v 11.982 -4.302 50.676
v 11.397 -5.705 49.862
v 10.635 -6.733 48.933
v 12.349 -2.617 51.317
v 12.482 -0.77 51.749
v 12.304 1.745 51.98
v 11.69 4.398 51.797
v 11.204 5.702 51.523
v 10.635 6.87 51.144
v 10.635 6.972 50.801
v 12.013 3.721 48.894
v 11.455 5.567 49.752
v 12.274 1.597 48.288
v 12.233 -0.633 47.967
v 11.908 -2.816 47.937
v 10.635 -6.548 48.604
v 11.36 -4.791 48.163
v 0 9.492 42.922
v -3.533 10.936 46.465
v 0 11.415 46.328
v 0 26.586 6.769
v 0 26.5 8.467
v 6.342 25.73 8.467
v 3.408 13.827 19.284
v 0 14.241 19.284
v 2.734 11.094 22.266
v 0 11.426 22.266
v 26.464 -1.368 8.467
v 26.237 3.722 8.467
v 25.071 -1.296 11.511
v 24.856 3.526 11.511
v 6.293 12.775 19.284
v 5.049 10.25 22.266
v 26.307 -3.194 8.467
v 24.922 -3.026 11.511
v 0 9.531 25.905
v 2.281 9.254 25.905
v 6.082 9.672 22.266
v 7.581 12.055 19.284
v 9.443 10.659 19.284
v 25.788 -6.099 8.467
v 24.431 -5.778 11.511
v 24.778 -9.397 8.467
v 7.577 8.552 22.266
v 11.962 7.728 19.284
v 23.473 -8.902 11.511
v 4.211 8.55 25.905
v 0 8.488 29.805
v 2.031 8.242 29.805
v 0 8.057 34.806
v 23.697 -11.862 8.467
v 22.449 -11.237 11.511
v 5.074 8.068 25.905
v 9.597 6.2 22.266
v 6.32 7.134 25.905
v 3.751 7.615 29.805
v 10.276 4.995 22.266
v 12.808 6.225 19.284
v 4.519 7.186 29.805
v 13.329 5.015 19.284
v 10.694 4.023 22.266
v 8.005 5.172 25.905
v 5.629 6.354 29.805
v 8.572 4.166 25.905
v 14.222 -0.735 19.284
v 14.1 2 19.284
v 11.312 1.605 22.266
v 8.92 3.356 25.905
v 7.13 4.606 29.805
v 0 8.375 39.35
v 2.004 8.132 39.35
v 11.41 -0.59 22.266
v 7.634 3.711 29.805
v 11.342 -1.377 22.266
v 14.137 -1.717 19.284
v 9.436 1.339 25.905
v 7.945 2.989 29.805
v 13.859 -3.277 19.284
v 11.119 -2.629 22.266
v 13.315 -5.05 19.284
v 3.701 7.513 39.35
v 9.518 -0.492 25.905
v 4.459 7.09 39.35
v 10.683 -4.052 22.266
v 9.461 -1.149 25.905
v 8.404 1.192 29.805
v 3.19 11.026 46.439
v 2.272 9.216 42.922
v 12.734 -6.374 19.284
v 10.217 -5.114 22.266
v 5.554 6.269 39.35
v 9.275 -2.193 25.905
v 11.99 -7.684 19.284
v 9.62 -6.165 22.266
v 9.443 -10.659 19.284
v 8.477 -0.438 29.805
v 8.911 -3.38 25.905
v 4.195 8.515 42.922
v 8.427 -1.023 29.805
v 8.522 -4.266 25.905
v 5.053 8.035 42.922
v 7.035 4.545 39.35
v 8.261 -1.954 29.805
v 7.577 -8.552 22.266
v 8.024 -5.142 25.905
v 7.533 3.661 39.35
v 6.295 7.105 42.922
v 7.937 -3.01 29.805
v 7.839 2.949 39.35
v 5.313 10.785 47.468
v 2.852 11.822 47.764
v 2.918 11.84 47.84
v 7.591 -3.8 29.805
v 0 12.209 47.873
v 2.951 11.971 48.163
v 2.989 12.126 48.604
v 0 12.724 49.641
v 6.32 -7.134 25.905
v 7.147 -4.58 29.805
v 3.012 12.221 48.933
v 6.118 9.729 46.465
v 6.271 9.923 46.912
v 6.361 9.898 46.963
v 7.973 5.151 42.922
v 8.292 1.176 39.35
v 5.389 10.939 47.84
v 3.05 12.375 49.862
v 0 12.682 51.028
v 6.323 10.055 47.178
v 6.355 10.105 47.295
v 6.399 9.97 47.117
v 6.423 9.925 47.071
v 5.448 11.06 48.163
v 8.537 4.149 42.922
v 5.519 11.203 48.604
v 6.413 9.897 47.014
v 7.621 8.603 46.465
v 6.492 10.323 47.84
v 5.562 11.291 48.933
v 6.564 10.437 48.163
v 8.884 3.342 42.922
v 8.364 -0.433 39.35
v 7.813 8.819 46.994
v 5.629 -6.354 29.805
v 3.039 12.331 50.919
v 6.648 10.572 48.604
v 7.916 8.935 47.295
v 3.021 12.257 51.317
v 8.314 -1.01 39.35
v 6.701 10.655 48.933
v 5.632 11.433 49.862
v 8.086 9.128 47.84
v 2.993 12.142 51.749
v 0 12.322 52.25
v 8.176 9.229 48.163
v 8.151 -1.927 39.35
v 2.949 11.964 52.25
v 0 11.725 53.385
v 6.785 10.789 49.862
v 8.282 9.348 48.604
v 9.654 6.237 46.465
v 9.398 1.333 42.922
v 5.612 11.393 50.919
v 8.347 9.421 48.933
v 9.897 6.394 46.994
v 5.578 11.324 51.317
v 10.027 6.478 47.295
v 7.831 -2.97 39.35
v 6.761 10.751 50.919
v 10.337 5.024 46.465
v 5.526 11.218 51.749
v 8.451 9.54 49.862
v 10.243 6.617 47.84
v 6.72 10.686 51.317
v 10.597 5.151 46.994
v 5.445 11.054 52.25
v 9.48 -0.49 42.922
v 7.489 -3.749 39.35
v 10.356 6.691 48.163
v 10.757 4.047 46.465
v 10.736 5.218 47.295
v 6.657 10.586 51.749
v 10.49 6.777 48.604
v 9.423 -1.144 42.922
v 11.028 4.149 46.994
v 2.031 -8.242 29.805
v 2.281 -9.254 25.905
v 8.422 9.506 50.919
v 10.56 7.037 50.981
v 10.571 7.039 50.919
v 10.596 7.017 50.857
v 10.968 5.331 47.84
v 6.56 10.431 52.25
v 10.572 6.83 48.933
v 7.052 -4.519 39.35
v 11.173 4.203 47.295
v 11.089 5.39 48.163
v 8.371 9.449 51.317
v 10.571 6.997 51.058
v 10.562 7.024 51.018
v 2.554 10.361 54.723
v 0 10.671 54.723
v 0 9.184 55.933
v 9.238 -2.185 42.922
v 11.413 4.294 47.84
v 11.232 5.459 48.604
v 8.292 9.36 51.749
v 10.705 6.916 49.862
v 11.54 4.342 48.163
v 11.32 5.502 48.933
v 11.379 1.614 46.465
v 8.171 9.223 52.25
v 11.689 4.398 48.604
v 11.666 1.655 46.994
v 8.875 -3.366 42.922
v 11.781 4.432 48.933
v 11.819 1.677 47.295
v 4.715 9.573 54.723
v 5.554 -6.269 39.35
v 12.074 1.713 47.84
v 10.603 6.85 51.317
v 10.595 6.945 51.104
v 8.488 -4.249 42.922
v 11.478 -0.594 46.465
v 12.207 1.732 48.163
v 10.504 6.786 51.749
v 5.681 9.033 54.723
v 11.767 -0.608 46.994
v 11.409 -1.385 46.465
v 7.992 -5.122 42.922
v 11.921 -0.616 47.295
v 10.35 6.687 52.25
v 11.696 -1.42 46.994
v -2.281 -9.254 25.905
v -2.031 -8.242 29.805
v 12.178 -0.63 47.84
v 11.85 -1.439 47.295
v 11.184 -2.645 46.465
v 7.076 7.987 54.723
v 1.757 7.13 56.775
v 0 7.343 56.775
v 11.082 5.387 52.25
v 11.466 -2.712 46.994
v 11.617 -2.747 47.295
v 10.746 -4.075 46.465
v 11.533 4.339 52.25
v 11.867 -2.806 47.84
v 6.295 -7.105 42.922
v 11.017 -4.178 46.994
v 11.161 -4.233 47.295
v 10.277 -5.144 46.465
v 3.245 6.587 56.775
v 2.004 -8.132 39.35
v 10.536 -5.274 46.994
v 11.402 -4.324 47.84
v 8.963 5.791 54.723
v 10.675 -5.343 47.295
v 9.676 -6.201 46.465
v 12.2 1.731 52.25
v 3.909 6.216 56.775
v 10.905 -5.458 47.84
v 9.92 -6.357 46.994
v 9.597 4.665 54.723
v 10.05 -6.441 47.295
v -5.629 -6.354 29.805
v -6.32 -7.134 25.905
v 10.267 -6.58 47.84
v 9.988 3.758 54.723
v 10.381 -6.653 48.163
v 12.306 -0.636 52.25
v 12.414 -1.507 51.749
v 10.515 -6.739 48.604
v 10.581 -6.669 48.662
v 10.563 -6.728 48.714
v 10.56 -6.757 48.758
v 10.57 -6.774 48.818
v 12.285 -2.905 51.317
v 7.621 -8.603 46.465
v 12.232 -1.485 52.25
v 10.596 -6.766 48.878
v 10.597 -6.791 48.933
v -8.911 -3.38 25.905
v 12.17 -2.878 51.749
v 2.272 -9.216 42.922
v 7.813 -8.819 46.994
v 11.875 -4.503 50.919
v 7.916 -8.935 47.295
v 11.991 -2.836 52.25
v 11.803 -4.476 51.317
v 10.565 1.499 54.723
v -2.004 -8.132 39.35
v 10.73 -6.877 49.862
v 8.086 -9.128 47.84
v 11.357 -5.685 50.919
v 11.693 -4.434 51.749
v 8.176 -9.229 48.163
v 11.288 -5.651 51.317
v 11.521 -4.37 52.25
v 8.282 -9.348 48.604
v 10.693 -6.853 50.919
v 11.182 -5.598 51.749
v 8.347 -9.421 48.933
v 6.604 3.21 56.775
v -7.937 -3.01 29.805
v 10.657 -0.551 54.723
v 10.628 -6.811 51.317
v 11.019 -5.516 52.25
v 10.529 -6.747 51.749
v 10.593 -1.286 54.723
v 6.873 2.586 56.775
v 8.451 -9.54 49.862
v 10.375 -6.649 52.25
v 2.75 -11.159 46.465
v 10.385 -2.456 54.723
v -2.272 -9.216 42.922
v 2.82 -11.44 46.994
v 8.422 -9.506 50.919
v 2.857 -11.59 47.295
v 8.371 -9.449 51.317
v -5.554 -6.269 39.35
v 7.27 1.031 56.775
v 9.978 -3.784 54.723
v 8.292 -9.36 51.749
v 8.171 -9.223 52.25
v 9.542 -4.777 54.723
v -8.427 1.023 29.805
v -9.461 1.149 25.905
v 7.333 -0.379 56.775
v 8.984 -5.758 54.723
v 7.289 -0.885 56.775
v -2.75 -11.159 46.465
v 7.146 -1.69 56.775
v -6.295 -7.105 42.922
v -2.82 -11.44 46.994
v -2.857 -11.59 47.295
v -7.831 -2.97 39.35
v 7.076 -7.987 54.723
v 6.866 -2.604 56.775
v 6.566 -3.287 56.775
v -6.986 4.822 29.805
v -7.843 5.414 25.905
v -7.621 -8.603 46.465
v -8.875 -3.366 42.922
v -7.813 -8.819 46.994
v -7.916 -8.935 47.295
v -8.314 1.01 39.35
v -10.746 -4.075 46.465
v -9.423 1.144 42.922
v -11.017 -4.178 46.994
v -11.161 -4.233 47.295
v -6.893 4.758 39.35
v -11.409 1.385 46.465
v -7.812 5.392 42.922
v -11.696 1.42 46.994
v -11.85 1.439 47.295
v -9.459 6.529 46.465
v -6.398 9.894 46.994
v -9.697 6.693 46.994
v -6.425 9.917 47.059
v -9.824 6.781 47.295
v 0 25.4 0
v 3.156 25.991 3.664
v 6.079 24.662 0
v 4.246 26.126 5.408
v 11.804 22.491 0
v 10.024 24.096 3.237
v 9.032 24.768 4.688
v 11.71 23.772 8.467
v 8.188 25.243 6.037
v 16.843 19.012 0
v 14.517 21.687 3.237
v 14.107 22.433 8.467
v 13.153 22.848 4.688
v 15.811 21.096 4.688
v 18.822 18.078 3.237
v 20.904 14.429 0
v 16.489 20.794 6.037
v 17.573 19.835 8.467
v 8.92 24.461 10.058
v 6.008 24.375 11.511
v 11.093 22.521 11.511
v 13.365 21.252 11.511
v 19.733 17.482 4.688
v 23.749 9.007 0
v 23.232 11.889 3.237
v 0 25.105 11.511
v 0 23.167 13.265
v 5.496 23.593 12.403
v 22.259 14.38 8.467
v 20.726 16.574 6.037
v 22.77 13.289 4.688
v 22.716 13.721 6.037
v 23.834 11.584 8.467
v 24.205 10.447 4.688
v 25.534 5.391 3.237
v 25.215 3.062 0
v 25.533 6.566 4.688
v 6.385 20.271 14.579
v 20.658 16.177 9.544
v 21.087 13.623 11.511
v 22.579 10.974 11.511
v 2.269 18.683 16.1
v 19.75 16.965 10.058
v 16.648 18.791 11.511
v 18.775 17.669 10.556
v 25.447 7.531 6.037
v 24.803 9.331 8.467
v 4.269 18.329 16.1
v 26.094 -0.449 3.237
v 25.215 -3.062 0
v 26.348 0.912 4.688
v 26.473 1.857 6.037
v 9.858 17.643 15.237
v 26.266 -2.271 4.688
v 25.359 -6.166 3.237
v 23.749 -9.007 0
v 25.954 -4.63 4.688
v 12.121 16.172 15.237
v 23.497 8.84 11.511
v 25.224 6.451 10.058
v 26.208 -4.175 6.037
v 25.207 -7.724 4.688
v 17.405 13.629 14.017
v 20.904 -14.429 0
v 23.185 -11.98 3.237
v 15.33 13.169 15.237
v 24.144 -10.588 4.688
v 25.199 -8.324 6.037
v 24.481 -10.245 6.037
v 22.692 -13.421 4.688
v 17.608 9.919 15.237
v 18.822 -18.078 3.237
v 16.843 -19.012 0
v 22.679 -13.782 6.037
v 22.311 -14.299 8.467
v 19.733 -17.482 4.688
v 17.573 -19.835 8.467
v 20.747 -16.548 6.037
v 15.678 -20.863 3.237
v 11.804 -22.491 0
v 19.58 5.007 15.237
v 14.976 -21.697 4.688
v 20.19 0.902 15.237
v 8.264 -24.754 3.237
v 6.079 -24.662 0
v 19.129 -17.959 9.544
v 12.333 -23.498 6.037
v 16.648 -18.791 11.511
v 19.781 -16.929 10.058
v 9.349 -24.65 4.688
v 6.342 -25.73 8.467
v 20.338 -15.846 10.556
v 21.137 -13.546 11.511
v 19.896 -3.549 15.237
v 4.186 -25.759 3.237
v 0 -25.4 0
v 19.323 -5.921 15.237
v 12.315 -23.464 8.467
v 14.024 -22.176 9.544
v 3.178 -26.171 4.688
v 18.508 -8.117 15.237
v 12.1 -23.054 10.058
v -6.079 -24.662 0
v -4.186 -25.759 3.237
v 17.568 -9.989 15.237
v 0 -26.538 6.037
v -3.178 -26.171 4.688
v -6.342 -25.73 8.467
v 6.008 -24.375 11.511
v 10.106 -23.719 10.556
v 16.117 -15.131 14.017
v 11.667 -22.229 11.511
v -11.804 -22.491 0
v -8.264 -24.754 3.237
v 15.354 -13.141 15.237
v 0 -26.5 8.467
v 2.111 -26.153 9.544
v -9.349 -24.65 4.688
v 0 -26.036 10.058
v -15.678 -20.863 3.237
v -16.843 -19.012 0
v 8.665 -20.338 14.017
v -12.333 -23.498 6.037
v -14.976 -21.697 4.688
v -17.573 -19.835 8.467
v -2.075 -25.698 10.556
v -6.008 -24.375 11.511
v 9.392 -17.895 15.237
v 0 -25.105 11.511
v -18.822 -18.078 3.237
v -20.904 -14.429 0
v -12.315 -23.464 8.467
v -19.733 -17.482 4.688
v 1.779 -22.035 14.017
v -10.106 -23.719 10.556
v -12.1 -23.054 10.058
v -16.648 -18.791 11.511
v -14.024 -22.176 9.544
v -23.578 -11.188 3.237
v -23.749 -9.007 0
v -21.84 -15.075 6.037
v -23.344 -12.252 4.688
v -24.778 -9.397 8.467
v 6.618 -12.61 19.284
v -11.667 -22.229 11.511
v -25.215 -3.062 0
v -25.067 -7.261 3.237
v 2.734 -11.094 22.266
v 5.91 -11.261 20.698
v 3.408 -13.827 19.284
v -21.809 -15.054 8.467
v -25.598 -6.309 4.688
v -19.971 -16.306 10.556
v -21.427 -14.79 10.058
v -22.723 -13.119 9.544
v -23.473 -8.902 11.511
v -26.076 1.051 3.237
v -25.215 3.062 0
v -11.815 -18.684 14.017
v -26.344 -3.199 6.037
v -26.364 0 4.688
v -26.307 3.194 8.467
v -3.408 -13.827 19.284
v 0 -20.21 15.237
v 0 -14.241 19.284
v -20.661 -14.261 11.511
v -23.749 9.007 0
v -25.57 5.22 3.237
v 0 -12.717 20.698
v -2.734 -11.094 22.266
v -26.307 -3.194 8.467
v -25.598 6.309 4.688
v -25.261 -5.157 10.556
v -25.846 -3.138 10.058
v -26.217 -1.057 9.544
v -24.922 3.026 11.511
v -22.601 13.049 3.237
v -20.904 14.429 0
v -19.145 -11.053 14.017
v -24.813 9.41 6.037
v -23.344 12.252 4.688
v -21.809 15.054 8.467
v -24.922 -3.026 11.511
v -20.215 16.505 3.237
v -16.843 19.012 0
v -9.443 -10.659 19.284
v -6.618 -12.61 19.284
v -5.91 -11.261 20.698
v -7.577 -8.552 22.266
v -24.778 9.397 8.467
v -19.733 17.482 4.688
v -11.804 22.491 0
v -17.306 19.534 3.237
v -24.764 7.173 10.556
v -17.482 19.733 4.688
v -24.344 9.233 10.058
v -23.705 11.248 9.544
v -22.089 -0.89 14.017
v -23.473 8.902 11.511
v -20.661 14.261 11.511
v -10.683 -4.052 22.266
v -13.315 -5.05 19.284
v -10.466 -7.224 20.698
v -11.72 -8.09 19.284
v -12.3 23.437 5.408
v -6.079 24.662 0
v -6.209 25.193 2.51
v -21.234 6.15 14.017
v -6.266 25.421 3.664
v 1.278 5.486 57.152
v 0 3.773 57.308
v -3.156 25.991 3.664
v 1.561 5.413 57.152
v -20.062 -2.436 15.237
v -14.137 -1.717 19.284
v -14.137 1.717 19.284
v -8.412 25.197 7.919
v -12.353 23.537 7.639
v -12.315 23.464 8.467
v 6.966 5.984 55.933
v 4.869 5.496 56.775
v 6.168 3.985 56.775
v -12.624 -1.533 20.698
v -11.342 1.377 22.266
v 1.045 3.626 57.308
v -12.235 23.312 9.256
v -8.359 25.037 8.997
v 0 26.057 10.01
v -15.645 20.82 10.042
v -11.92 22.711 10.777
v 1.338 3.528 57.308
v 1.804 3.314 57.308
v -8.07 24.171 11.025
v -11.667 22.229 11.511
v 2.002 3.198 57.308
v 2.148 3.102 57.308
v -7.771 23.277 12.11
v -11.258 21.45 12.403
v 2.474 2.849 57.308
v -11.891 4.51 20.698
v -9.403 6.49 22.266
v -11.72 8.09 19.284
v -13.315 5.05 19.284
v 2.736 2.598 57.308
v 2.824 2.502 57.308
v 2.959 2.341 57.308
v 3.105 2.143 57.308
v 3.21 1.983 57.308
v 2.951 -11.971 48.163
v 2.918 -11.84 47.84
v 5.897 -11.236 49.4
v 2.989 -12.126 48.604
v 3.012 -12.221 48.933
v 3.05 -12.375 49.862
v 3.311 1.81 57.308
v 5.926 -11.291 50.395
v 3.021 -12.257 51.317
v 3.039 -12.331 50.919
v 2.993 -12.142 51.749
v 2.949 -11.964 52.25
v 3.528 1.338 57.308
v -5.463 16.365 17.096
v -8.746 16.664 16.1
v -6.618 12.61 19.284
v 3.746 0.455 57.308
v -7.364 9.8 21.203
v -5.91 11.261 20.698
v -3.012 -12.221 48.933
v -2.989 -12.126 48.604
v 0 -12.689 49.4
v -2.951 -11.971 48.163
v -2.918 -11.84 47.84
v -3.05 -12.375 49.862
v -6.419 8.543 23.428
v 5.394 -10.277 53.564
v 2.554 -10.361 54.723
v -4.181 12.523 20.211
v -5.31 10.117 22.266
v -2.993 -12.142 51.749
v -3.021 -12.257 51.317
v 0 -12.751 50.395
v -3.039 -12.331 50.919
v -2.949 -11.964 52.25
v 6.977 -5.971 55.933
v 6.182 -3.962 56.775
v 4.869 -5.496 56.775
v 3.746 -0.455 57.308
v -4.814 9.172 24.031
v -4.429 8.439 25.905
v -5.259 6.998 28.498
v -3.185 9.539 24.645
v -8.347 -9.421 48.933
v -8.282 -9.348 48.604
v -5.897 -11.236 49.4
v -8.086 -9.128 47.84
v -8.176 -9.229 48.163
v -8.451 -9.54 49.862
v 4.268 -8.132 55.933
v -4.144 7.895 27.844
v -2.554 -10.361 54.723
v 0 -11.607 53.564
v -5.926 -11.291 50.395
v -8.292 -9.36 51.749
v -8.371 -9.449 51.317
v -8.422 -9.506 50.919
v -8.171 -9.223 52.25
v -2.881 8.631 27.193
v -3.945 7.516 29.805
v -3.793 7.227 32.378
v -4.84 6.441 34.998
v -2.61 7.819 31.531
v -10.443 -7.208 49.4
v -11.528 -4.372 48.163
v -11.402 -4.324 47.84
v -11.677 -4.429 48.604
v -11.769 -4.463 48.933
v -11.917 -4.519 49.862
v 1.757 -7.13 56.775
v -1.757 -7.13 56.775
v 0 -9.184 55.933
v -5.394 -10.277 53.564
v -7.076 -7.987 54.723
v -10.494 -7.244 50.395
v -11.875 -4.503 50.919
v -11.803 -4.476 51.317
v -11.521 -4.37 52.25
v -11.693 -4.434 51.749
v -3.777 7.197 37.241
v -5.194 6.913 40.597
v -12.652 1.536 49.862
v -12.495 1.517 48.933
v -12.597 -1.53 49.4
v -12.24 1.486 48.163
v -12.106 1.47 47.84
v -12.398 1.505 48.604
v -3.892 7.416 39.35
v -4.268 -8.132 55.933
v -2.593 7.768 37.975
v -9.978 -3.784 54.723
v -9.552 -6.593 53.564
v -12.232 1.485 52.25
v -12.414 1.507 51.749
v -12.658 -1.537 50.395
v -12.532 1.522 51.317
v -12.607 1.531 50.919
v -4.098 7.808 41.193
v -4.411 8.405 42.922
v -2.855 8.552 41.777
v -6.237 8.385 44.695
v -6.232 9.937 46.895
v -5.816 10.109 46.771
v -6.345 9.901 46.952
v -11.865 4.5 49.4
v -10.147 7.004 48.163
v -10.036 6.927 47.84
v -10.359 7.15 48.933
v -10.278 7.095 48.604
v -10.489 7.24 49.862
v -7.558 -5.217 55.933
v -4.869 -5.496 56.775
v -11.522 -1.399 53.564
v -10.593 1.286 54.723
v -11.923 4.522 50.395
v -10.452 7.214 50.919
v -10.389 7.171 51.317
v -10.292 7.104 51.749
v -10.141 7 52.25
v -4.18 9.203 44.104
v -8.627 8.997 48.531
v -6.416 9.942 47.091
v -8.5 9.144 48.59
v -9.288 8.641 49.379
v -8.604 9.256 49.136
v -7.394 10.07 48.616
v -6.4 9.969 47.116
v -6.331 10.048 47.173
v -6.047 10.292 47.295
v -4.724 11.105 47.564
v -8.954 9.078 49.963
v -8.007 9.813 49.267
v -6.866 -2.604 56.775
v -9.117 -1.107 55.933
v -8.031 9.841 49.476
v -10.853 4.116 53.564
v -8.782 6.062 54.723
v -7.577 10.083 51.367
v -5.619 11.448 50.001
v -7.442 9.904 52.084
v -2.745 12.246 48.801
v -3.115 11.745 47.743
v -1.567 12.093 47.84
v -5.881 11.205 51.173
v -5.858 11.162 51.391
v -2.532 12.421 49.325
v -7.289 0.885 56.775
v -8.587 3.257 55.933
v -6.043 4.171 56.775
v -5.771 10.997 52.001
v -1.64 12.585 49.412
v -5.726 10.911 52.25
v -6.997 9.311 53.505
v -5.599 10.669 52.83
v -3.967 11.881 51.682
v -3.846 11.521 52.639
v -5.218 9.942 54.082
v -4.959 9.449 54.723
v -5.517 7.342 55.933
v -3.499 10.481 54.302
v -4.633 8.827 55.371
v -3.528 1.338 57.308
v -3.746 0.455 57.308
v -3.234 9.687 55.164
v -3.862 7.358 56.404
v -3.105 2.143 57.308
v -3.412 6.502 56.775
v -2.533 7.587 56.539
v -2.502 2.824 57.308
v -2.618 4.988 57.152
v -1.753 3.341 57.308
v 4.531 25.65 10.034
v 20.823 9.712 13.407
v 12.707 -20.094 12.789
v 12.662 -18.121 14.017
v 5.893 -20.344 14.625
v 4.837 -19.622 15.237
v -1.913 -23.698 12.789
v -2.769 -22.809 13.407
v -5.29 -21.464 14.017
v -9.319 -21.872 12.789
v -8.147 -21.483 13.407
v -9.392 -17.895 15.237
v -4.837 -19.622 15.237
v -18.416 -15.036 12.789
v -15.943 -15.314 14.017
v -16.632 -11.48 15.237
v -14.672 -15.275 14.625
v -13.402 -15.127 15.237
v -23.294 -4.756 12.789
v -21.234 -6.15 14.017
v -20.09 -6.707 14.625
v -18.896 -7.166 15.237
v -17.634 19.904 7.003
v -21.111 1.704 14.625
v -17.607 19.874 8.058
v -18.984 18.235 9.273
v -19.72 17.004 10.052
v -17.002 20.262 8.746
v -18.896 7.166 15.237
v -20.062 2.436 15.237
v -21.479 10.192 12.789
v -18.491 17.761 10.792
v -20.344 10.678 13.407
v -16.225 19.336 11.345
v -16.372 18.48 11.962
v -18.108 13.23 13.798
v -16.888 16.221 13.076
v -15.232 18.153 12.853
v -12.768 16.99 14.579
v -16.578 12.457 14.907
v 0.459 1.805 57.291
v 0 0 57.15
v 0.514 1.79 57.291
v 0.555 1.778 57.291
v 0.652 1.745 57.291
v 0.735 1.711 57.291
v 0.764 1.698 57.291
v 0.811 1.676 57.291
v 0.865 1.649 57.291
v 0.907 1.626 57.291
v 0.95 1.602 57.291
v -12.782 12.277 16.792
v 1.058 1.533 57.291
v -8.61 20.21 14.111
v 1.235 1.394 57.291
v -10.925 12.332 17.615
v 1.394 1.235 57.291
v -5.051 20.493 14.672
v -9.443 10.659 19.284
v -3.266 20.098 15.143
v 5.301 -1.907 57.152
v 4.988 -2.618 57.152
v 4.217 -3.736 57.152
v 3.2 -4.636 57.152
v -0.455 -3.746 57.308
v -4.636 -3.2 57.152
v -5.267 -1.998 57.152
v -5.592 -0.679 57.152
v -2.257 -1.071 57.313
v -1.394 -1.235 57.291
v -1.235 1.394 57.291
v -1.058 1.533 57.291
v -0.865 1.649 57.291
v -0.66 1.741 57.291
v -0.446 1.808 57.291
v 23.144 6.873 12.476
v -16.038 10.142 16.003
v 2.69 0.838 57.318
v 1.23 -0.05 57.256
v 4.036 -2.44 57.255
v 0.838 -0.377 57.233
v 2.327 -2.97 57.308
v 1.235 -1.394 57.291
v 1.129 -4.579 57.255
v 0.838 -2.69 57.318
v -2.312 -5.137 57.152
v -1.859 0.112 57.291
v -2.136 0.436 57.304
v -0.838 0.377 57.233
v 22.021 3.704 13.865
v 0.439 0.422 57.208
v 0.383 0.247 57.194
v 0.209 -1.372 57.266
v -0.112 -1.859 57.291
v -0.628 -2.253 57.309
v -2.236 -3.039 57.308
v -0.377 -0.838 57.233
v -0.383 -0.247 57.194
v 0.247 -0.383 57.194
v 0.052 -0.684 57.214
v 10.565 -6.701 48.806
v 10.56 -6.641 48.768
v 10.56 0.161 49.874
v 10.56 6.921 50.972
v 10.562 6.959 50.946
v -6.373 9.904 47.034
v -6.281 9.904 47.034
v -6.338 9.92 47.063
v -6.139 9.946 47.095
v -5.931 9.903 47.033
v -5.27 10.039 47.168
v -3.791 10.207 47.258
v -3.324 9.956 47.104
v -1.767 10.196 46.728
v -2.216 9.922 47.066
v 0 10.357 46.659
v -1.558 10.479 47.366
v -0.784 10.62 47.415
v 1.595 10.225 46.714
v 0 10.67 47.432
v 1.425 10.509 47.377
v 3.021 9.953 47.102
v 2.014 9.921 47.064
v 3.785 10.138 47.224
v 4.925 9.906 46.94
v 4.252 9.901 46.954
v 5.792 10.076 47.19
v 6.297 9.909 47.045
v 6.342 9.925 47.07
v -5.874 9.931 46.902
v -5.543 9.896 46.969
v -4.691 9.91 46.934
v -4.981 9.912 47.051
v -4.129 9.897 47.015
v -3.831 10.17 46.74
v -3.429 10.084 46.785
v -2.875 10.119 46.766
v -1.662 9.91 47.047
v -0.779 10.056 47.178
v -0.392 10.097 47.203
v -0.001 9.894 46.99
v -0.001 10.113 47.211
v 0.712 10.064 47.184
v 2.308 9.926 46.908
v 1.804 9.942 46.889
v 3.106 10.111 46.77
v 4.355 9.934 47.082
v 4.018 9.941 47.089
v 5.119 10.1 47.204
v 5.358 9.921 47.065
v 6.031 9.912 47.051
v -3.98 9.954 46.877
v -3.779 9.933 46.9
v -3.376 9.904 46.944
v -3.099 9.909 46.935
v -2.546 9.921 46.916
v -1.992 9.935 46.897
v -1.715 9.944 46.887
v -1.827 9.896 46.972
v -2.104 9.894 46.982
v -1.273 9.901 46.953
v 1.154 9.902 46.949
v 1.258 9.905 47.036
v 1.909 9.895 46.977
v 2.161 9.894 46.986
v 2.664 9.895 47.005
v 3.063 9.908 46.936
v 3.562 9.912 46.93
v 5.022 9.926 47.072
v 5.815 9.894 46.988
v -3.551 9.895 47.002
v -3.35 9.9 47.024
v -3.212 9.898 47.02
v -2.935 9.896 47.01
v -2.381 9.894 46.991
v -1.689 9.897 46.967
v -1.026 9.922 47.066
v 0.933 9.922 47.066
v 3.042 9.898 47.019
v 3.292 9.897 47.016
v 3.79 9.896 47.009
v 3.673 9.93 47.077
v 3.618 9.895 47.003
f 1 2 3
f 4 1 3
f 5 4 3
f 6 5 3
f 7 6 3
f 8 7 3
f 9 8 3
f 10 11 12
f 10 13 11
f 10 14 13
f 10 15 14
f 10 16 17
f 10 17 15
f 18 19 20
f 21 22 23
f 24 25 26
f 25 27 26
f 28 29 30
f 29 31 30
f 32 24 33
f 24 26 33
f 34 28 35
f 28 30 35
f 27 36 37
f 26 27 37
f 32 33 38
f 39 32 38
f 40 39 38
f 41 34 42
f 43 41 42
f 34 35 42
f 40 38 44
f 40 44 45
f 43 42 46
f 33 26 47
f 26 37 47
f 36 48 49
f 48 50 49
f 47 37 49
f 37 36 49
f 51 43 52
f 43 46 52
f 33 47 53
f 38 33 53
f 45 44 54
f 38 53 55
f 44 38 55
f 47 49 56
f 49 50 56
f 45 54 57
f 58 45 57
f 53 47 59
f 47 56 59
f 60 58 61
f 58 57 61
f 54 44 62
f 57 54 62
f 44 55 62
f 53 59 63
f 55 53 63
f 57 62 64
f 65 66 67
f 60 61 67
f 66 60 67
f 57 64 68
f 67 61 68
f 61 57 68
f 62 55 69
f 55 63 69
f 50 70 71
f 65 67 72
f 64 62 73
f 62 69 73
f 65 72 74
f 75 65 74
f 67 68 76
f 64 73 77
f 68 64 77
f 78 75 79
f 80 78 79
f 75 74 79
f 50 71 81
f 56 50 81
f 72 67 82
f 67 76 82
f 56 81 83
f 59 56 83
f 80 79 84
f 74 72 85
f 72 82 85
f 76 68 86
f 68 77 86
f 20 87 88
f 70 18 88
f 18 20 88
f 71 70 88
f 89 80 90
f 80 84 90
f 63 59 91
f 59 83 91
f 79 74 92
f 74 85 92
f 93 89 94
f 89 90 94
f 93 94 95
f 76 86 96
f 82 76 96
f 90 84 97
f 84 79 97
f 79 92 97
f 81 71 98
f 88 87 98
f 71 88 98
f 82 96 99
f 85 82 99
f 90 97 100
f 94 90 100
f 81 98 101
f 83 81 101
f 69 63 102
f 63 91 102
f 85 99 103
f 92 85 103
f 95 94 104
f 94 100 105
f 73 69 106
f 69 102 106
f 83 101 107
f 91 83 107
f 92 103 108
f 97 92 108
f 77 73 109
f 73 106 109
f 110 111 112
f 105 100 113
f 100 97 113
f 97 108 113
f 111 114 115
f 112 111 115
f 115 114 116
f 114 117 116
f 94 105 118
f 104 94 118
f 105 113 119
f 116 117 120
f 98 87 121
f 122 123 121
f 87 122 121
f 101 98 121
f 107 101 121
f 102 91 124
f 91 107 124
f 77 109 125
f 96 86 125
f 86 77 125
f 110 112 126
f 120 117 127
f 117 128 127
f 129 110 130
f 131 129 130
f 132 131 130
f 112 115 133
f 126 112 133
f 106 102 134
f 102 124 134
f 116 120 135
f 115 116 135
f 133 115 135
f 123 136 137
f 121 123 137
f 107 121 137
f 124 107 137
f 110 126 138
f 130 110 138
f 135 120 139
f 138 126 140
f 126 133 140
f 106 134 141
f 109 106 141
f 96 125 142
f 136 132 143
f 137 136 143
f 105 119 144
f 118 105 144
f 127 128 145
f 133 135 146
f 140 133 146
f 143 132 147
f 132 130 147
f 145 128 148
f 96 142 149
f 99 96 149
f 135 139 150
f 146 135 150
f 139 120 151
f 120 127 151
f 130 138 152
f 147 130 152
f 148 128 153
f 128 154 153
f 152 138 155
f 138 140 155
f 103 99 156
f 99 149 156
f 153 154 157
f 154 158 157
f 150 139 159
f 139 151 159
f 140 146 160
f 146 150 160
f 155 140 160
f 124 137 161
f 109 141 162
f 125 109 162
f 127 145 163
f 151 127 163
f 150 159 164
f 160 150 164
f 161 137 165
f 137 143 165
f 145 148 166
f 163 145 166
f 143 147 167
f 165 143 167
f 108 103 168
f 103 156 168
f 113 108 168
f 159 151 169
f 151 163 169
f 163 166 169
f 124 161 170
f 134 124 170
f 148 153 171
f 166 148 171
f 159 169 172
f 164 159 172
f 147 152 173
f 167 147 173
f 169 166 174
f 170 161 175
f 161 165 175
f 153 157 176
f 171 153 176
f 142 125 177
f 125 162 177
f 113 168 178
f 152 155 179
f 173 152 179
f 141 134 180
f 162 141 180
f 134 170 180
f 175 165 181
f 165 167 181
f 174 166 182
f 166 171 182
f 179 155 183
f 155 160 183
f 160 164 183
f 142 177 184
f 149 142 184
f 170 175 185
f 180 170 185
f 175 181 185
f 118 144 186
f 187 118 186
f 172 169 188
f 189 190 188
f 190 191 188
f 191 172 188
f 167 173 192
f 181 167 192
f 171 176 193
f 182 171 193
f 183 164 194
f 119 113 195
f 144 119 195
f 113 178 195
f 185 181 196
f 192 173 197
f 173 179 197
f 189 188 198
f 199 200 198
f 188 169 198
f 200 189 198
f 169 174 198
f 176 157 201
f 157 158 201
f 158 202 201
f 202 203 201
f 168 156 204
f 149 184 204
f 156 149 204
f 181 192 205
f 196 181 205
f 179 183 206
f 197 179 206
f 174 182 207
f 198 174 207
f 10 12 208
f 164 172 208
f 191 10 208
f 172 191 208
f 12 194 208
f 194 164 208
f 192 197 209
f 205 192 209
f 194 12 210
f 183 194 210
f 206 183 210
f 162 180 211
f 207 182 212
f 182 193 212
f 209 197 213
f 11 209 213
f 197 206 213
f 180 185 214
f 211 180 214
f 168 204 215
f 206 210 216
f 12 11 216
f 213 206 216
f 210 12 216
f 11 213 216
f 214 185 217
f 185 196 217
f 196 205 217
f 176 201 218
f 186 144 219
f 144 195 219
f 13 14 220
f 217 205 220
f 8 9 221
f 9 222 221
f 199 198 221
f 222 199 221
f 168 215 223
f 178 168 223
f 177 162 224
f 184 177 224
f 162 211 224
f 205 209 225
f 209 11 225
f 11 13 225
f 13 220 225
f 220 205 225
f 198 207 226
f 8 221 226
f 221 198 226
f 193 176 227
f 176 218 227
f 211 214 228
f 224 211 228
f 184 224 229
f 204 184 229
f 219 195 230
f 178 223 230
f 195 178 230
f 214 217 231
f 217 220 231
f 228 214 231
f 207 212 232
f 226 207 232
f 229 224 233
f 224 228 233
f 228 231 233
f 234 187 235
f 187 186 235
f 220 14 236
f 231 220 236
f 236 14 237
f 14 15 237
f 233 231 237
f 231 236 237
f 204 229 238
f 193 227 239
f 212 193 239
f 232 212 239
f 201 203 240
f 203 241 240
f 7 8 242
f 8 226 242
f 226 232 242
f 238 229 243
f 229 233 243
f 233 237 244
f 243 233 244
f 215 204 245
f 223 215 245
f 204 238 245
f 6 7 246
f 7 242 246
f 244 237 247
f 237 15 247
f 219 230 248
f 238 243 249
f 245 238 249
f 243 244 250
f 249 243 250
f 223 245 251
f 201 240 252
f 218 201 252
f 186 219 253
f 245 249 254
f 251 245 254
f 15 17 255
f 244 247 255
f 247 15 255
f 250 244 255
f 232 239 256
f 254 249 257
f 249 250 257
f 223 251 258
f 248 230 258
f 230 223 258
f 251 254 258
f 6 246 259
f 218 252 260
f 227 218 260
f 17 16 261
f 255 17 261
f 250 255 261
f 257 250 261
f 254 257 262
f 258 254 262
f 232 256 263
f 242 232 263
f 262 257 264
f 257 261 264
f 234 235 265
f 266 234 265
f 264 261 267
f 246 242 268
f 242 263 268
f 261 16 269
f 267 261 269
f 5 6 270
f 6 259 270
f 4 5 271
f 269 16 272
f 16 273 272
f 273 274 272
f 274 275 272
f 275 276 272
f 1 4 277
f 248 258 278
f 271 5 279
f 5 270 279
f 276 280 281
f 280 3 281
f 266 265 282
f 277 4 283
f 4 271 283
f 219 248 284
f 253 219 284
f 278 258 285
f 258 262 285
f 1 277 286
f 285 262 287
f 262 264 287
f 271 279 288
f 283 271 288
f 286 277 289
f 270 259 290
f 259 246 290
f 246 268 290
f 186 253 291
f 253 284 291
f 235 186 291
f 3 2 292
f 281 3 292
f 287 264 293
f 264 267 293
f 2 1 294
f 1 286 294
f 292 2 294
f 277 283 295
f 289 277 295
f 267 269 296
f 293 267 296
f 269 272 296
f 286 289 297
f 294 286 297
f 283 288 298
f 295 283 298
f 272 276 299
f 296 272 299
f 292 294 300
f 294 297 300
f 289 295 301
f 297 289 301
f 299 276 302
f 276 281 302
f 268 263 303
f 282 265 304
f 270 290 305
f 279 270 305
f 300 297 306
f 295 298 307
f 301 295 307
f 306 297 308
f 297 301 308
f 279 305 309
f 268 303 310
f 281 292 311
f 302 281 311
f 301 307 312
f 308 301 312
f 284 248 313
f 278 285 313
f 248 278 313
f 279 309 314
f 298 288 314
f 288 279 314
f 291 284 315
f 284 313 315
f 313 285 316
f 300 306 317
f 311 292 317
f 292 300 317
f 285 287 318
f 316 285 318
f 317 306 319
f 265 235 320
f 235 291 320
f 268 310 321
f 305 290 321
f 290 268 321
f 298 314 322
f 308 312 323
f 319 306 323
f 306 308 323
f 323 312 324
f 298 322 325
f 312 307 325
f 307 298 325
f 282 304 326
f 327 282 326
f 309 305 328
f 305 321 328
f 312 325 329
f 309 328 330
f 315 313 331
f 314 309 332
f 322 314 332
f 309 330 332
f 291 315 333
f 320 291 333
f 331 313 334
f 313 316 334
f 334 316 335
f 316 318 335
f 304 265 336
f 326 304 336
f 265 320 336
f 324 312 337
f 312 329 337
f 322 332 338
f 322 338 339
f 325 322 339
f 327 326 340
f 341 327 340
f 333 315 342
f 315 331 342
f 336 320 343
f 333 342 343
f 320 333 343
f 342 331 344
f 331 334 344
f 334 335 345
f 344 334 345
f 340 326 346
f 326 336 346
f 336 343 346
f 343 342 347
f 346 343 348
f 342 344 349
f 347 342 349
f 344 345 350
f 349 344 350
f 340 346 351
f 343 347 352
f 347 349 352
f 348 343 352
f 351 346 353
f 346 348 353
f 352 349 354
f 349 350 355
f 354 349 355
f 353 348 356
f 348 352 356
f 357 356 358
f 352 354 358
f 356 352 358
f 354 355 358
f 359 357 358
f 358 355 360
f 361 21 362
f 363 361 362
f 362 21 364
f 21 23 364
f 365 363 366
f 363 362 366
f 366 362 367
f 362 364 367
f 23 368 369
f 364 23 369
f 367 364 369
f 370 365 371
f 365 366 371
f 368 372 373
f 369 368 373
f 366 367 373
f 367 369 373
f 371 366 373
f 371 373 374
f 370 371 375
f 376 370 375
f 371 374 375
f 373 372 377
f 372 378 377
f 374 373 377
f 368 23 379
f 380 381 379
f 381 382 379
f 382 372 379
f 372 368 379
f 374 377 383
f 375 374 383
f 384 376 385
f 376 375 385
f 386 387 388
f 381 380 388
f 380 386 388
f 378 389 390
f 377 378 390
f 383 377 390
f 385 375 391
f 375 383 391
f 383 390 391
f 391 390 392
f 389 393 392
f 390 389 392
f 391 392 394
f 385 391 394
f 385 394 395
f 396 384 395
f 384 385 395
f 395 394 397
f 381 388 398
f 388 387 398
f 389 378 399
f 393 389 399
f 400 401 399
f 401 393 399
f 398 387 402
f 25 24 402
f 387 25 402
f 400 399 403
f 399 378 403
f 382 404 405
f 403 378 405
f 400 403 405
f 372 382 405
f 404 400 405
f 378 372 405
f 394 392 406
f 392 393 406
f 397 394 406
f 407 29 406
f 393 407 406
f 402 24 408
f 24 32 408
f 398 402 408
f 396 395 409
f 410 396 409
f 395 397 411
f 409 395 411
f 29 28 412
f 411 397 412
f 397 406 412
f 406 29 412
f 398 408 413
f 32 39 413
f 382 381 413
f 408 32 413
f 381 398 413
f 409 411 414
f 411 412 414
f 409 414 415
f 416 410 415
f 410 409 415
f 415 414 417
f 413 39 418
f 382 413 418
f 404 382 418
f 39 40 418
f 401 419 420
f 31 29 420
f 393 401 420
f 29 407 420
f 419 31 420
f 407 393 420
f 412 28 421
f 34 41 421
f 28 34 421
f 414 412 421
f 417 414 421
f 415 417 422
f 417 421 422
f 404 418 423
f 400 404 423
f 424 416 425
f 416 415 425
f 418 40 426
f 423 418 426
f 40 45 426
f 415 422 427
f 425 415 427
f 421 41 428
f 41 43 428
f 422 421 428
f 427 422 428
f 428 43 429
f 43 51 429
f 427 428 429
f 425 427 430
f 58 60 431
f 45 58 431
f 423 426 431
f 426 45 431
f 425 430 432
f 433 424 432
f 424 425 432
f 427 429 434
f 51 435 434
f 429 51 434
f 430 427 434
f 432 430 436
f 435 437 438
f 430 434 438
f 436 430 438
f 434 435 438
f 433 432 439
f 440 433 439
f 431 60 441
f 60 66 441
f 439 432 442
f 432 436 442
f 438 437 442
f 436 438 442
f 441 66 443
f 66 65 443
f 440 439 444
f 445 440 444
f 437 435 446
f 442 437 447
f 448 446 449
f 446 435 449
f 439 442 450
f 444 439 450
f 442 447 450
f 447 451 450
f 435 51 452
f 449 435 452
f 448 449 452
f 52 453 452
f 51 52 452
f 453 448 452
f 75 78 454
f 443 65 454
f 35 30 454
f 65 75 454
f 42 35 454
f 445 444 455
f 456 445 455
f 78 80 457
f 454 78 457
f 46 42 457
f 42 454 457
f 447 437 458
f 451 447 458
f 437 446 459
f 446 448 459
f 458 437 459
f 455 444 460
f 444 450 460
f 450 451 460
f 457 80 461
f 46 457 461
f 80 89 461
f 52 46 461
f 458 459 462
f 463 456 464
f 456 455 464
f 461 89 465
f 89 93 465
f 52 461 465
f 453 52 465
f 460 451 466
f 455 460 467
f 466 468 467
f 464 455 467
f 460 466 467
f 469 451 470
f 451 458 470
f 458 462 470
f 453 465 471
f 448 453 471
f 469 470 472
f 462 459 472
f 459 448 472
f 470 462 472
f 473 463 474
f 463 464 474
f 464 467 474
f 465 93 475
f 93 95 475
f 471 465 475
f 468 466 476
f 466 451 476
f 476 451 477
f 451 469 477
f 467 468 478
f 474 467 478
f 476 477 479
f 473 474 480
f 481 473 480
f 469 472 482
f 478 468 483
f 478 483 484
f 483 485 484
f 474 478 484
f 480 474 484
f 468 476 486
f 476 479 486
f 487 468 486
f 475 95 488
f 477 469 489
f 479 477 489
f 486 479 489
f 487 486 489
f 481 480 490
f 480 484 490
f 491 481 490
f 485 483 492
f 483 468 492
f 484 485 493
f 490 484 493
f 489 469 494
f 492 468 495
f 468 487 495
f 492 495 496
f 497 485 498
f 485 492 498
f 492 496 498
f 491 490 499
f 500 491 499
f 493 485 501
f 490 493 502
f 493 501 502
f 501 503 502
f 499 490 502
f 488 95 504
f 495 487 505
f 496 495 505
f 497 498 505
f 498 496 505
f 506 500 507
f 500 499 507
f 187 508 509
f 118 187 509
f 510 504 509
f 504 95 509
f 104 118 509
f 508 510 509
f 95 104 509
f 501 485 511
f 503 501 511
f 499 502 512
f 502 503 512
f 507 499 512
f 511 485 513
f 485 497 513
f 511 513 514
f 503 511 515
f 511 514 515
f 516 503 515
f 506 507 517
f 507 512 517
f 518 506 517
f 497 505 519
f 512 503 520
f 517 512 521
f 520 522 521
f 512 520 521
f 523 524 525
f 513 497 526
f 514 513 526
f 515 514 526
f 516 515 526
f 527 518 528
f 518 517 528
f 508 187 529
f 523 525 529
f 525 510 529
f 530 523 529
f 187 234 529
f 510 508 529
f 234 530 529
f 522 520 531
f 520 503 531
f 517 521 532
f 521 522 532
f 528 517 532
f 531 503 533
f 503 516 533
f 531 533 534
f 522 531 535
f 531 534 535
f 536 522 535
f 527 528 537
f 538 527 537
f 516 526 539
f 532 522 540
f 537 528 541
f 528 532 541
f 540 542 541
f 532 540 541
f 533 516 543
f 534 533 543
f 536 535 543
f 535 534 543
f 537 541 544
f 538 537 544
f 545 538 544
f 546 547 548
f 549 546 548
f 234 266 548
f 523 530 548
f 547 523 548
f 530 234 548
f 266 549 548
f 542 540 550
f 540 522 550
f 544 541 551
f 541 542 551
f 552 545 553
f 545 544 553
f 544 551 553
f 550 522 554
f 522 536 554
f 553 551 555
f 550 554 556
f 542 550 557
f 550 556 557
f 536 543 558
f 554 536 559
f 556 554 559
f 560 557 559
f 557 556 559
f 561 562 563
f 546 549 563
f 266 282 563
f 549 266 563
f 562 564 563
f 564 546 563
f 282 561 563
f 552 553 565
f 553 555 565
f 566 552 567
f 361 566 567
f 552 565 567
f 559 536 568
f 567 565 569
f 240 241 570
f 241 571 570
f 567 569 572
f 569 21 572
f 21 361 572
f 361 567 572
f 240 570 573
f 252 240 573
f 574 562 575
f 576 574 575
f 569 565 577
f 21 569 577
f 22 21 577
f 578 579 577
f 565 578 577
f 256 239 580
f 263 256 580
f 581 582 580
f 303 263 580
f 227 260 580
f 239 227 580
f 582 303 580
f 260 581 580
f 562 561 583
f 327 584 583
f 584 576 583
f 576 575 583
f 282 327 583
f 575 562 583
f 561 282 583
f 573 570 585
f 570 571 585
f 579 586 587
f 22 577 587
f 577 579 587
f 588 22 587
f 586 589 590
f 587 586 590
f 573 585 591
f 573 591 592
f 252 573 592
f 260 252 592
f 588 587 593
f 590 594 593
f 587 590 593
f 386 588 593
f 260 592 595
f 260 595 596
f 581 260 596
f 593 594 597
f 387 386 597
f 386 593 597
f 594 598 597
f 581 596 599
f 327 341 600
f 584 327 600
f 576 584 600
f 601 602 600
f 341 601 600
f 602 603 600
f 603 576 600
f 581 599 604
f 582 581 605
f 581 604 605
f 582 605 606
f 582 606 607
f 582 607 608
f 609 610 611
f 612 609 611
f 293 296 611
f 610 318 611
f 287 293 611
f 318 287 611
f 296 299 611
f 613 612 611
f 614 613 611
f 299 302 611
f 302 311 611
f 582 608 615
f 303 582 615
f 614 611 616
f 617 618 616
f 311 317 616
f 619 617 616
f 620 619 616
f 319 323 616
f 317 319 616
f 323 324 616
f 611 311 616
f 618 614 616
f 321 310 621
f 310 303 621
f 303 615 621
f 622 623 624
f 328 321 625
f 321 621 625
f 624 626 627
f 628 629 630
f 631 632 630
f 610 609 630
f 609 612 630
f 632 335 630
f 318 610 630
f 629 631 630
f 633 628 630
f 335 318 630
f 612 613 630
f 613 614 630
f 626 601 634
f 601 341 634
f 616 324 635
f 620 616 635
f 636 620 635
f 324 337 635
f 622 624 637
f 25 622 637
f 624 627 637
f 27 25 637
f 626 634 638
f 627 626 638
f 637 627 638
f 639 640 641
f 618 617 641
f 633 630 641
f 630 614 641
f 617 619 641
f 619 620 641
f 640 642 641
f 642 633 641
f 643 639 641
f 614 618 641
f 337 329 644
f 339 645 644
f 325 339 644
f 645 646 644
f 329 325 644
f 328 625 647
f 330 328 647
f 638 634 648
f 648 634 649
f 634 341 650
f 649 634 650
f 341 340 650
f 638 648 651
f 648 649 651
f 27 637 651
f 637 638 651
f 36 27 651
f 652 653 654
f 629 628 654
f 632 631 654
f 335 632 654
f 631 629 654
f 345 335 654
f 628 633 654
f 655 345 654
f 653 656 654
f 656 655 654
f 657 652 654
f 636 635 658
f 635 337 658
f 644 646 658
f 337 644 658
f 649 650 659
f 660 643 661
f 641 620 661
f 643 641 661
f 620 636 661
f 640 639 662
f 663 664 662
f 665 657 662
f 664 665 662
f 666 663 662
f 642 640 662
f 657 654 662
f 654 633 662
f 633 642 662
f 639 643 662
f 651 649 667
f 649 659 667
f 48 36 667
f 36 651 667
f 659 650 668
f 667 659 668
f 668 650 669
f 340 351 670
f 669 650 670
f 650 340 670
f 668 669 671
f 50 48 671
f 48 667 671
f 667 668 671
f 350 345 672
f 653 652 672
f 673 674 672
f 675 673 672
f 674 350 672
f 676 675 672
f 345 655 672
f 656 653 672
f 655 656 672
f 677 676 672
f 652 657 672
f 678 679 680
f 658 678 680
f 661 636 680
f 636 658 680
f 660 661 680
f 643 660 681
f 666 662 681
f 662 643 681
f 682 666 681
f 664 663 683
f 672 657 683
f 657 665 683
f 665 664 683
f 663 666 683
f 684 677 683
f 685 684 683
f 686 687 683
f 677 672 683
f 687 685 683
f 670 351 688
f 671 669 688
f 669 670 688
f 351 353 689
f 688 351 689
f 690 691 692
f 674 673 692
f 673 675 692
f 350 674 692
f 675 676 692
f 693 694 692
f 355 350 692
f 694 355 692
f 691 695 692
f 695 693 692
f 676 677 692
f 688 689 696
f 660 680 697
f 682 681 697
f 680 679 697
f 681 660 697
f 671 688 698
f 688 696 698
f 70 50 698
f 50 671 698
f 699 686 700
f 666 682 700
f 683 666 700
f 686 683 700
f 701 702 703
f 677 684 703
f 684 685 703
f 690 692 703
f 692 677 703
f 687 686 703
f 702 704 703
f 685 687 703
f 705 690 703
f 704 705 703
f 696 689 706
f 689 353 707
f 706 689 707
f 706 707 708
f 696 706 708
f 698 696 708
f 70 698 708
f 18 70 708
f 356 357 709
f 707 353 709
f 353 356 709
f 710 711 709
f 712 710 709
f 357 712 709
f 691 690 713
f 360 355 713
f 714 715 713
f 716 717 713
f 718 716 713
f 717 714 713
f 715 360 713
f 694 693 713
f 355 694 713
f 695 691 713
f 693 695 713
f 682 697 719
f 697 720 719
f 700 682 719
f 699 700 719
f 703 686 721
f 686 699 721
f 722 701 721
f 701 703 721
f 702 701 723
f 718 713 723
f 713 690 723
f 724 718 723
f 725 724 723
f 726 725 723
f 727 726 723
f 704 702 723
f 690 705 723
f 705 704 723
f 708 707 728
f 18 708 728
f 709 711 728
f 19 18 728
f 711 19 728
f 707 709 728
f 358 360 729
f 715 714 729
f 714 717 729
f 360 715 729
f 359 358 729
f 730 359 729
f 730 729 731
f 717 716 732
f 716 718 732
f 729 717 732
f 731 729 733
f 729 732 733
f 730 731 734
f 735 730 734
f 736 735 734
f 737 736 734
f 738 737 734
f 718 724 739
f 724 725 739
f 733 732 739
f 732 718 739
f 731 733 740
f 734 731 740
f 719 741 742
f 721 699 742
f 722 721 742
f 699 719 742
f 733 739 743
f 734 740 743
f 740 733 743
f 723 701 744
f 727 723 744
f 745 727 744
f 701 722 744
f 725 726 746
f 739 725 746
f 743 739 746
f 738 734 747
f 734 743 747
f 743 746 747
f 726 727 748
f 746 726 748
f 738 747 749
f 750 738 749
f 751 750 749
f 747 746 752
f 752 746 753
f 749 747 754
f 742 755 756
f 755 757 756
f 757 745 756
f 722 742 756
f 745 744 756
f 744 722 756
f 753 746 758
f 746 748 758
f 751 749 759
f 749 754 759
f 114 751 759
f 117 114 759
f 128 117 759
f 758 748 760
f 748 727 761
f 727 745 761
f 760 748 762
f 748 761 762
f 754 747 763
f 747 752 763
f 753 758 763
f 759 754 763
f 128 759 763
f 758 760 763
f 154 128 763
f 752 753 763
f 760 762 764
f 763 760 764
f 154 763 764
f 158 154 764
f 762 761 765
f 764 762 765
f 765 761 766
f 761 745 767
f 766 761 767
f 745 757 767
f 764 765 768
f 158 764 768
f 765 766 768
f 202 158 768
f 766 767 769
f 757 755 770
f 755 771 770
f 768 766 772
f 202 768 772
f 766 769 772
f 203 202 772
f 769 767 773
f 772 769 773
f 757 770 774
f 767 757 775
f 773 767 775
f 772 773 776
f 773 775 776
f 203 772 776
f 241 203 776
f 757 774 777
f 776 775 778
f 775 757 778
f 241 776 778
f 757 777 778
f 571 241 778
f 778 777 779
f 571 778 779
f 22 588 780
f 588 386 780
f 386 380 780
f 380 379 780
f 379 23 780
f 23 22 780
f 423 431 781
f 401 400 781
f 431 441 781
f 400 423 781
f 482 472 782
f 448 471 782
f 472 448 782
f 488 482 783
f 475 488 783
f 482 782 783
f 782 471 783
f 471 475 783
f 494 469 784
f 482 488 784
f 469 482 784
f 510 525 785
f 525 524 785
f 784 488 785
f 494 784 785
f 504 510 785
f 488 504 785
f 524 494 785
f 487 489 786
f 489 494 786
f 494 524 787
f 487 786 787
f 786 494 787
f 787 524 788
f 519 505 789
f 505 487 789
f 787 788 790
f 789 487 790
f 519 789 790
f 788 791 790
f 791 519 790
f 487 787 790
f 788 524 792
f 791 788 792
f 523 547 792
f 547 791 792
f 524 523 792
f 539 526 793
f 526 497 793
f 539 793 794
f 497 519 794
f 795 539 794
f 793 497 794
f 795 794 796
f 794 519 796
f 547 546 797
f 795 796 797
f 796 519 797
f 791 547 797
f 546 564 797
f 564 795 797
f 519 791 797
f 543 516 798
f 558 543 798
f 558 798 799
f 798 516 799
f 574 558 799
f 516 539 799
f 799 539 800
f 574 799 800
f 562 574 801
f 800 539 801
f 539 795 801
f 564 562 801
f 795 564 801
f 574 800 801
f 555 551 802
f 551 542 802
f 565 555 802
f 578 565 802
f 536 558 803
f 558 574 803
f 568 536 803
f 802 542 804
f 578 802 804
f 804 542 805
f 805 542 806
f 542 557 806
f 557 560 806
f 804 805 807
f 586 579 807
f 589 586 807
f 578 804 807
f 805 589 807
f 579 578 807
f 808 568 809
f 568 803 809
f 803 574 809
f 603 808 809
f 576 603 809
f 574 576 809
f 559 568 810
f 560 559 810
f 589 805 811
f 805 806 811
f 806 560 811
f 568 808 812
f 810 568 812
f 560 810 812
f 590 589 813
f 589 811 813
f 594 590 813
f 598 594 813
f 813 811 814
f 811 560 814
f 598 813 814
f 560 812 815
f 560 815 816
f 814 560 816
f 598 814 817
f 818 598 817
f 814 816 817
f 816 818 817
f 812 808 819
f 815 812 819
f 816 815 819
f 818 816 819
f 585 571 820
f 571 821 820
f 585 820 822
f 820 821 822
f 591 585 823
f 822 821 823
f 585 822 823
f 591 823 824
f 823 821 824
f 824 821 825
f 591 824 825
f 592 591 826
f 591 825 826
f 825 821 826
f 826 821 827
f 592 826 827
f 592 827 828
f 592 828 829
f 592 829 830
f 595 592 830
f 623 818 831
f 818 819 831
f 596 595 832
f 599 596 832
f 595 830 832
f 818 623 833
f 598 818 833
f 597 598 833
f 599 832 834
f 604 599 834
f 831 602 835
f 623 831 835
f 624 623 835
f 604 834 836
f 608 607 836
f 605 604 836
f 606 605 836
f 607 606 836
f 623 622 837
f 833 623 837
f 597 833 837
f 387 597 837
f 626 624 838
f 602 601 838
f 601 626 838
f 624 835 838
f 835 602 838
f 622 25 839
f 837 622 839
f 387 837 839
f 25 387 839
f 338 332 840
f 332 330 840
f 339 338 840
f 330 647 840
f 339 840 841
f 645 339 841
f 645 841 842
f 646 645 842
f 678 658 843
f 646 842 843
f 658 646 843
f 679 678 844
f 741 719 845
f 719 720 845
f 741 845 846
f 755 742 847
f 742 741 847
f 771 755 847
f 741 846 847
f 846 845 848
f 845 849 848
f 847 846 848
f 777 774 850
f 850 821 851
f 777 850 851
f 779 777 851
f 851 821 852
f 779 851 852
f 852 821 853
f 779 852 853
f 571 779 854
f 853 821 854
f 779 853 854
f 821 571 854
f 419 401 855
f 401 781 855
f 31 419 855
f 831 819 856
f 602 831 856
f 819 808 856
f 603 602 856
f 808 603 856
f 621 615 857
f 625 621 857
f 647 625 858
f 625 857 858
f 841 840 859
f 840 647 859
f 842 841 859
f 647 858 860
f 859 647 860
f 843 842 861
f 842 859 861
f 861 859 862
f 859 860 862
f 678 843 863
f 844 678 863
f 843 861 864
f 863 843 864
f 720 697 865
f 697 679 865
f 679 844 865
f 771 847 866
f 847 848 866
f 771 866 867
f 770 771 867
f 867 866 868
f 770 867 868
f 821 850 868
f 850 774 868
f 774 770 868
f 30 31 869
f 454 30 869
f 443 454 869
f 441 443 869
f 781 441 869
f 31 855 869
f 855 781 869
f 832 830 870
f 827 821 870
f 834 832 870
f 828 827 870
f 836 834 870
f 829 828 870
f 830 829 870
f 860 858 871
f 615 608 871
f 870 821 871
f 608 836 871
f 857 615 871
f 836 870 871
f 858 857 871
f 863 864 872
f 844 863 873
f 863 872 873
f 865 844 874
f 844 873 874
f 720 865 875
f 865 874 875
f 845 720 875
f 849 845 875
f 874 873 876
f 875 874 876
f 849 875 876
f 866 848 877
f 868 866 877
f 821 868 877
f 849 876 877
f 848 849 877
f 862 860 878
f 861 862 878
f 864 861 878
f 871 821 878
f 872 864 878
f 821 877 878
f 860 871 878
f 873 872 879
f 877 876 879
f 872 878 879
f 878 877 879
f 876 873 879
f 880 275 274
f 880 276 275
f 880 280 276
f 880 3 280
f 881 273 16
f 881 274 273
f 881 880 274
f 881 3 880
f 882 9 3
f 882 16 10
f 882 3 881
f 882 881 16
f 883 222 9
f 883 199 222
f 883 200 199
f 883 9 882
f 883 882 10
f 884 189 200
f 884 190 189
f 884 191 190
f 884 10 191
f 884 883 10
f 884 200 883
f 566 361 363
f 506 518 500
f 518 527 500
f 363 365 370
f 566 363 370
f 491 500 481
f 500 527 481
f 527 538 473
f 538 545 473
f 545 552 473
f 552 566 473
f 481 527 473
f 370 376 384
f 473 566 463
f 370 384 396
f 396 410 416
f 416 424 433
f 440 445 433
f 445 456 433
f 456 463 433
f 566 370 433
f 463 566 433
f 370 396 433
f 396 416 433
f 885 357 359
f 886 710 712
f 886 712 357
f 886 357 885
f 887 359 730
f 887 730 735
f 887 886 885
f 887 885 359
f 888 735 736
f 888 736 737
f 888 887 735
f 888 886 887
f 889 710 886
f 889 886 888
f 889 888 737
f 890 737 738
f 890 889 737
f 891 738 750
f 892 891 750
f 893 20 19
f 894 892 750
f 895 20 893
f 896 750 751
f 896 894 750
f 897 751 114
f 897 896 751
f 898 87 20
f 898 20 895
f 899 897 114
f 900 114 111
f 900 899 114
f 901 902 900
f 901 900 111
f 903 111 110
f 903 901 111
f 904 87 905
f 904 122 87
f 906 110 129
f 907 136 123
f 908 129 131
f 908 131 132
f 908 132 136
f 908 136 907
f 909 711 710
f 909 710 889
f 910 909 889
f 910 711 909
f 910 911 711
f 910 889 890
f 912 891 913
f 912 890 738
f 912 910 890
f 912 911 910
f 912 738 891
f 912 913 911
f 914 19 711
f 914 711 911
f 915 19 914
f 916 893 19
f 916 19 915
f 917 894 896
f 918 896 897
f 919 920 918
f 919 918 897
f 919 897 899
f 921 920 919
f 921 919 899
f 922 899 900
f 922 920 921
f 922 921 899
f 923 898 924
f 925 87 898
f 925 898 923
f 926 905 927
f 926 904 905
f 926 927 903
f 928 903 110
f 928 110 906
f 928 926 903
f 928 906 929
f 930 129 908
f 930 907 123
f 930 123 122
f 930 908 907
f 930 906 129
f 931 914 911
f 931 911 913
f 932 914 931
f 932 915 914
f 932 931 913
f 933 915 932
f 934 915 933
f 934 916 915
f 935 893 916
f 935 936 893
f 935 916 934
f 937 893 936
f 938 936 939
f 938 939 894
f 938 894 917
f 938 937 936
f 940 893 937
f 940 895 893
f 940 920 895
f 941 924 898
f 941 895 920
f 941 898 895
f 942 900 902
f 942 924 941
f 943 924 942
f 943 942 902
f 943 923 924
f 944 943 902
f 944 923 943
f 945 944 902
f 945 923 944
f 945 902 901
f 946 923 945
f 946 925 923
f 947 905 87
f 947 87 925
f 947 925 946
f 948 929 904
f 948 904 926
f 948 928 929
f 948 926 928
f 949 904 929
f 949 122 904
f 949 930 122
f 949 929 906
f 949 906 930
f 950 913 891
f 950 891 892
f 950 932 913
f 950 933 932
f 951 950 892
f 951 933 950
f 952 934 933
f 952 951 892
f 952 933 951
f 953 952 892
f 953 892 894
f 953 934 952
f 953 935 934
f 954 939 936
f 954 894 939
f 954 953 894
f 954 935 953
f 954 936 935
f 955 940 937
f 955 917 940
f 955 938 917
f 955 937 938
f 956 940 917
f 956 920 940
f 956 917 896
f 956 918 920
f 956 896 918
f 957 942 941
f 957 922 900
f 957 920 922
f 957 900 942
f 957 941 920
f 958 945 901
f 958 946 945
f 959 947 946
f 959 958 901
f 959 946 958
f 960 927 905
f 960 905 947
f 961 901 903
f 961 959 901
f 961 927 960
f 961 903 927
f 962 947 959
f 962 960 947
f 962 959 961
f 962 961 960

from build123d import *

# Parameters (mm, degrees)
F4_DEPTH = 25.4


with BuildPart() as f1:
    # F0 (on Right) → F1 (revolve)
    with BuildSketch(Plane.YZ):
        with BuildLine():
            Line((0, 57.15), (0, 0))
            Line((0, 0), (25.4, 0))
            add(Edge.make_bspline(
                [(25.4, 0), (26.4723256299, 4.9606971764), (28.6211804318, 12.577284252), (9.2115788749, 19.1583620388), (7.5184621892, 35.9929365466), (9.0247026487, 43.2231699218), (13.7513986841, 49.2130397008), (11.6198053885, 54.28721156), (7.4140153578, 57.4857358404), (2.3732369584, 57.3963116767), (0, 57.15)],
                knots=[0, 0, 0, 0, 0.1403992521, 0.3124015884, 0.4765816851, 0.5919187234, 0.7017041704, 0.7927919103, 0.8866335864, 1, 1, 1, 1], degree=3))
        make_face()
    revolve(axis=Axis((0, 0, 28.575), (0, 0, -1)))

    # F3 (on offset) → F4 (cut)
    with BuildSketch(Plane.YZ.offset(12.7)):
        with BuildLine():
            Line((12.4420020729, 46.0375), (12.4420020729, 47.9425))
            add(Edge.make_bspline(
                [(12.4420020729, 46.0375), (11.4020821617, 46.355), (8.3861514016, 46.99), (11.4020821617, 47.625), (12.4420020729, 47.9425)],
                knots=[0, 0, 0, 0, 0.5, 1, 1, 1, 1], degree=3))
        make_face()
    extrude(amount=-F4_DEPTH, mode=Mode.SUBTRACT)

    # F7 (on offset) → F9 section 0
    with BuildSketch(Plane.XZ.offset(25.4)):
        with BuildLine():
            Line((12.7, 43.4749359697), (14.9450640303, 45.72))
            Line((14.9450640303, 45.72), (12.7, 47.9650640303))
            Line((12.7, 47.9650640303), (10.6345410922, 45.8996051224))
            ThreePointArc((10.6345410922, 45.8996051224), (10.5601462146, 45.72), (10.6345410922, 45.5403948776))
            Line((10.6345410922, 45.5403948776), (12.7, 43.4749359697))
        make_face()
    # F8 (on offset) → F9 section 1
    with BuildSketch(Plane.XZ.offset(-25.4)):
        with BuildLine():
            Line((12.7, 51.7299359697), (14.9450640303, 53.975))
            Line((14.9450640303, 53.975), (12.7, 56.2200640303))
            Line((12.7, 56.2200640303), (10.6345410922, 54.1546051224))
            ThreePointArc((10.6345410922, 54.1546051224), (10.5601462146, 53.975), (10.6345410922, 53.7953948776))
            Line((10.6345410922, 53.7953948776), (12.7, 51.7299359697))
        make_face()
    loft(mode=Mode.SUBTRACT)


solid = f1.part
